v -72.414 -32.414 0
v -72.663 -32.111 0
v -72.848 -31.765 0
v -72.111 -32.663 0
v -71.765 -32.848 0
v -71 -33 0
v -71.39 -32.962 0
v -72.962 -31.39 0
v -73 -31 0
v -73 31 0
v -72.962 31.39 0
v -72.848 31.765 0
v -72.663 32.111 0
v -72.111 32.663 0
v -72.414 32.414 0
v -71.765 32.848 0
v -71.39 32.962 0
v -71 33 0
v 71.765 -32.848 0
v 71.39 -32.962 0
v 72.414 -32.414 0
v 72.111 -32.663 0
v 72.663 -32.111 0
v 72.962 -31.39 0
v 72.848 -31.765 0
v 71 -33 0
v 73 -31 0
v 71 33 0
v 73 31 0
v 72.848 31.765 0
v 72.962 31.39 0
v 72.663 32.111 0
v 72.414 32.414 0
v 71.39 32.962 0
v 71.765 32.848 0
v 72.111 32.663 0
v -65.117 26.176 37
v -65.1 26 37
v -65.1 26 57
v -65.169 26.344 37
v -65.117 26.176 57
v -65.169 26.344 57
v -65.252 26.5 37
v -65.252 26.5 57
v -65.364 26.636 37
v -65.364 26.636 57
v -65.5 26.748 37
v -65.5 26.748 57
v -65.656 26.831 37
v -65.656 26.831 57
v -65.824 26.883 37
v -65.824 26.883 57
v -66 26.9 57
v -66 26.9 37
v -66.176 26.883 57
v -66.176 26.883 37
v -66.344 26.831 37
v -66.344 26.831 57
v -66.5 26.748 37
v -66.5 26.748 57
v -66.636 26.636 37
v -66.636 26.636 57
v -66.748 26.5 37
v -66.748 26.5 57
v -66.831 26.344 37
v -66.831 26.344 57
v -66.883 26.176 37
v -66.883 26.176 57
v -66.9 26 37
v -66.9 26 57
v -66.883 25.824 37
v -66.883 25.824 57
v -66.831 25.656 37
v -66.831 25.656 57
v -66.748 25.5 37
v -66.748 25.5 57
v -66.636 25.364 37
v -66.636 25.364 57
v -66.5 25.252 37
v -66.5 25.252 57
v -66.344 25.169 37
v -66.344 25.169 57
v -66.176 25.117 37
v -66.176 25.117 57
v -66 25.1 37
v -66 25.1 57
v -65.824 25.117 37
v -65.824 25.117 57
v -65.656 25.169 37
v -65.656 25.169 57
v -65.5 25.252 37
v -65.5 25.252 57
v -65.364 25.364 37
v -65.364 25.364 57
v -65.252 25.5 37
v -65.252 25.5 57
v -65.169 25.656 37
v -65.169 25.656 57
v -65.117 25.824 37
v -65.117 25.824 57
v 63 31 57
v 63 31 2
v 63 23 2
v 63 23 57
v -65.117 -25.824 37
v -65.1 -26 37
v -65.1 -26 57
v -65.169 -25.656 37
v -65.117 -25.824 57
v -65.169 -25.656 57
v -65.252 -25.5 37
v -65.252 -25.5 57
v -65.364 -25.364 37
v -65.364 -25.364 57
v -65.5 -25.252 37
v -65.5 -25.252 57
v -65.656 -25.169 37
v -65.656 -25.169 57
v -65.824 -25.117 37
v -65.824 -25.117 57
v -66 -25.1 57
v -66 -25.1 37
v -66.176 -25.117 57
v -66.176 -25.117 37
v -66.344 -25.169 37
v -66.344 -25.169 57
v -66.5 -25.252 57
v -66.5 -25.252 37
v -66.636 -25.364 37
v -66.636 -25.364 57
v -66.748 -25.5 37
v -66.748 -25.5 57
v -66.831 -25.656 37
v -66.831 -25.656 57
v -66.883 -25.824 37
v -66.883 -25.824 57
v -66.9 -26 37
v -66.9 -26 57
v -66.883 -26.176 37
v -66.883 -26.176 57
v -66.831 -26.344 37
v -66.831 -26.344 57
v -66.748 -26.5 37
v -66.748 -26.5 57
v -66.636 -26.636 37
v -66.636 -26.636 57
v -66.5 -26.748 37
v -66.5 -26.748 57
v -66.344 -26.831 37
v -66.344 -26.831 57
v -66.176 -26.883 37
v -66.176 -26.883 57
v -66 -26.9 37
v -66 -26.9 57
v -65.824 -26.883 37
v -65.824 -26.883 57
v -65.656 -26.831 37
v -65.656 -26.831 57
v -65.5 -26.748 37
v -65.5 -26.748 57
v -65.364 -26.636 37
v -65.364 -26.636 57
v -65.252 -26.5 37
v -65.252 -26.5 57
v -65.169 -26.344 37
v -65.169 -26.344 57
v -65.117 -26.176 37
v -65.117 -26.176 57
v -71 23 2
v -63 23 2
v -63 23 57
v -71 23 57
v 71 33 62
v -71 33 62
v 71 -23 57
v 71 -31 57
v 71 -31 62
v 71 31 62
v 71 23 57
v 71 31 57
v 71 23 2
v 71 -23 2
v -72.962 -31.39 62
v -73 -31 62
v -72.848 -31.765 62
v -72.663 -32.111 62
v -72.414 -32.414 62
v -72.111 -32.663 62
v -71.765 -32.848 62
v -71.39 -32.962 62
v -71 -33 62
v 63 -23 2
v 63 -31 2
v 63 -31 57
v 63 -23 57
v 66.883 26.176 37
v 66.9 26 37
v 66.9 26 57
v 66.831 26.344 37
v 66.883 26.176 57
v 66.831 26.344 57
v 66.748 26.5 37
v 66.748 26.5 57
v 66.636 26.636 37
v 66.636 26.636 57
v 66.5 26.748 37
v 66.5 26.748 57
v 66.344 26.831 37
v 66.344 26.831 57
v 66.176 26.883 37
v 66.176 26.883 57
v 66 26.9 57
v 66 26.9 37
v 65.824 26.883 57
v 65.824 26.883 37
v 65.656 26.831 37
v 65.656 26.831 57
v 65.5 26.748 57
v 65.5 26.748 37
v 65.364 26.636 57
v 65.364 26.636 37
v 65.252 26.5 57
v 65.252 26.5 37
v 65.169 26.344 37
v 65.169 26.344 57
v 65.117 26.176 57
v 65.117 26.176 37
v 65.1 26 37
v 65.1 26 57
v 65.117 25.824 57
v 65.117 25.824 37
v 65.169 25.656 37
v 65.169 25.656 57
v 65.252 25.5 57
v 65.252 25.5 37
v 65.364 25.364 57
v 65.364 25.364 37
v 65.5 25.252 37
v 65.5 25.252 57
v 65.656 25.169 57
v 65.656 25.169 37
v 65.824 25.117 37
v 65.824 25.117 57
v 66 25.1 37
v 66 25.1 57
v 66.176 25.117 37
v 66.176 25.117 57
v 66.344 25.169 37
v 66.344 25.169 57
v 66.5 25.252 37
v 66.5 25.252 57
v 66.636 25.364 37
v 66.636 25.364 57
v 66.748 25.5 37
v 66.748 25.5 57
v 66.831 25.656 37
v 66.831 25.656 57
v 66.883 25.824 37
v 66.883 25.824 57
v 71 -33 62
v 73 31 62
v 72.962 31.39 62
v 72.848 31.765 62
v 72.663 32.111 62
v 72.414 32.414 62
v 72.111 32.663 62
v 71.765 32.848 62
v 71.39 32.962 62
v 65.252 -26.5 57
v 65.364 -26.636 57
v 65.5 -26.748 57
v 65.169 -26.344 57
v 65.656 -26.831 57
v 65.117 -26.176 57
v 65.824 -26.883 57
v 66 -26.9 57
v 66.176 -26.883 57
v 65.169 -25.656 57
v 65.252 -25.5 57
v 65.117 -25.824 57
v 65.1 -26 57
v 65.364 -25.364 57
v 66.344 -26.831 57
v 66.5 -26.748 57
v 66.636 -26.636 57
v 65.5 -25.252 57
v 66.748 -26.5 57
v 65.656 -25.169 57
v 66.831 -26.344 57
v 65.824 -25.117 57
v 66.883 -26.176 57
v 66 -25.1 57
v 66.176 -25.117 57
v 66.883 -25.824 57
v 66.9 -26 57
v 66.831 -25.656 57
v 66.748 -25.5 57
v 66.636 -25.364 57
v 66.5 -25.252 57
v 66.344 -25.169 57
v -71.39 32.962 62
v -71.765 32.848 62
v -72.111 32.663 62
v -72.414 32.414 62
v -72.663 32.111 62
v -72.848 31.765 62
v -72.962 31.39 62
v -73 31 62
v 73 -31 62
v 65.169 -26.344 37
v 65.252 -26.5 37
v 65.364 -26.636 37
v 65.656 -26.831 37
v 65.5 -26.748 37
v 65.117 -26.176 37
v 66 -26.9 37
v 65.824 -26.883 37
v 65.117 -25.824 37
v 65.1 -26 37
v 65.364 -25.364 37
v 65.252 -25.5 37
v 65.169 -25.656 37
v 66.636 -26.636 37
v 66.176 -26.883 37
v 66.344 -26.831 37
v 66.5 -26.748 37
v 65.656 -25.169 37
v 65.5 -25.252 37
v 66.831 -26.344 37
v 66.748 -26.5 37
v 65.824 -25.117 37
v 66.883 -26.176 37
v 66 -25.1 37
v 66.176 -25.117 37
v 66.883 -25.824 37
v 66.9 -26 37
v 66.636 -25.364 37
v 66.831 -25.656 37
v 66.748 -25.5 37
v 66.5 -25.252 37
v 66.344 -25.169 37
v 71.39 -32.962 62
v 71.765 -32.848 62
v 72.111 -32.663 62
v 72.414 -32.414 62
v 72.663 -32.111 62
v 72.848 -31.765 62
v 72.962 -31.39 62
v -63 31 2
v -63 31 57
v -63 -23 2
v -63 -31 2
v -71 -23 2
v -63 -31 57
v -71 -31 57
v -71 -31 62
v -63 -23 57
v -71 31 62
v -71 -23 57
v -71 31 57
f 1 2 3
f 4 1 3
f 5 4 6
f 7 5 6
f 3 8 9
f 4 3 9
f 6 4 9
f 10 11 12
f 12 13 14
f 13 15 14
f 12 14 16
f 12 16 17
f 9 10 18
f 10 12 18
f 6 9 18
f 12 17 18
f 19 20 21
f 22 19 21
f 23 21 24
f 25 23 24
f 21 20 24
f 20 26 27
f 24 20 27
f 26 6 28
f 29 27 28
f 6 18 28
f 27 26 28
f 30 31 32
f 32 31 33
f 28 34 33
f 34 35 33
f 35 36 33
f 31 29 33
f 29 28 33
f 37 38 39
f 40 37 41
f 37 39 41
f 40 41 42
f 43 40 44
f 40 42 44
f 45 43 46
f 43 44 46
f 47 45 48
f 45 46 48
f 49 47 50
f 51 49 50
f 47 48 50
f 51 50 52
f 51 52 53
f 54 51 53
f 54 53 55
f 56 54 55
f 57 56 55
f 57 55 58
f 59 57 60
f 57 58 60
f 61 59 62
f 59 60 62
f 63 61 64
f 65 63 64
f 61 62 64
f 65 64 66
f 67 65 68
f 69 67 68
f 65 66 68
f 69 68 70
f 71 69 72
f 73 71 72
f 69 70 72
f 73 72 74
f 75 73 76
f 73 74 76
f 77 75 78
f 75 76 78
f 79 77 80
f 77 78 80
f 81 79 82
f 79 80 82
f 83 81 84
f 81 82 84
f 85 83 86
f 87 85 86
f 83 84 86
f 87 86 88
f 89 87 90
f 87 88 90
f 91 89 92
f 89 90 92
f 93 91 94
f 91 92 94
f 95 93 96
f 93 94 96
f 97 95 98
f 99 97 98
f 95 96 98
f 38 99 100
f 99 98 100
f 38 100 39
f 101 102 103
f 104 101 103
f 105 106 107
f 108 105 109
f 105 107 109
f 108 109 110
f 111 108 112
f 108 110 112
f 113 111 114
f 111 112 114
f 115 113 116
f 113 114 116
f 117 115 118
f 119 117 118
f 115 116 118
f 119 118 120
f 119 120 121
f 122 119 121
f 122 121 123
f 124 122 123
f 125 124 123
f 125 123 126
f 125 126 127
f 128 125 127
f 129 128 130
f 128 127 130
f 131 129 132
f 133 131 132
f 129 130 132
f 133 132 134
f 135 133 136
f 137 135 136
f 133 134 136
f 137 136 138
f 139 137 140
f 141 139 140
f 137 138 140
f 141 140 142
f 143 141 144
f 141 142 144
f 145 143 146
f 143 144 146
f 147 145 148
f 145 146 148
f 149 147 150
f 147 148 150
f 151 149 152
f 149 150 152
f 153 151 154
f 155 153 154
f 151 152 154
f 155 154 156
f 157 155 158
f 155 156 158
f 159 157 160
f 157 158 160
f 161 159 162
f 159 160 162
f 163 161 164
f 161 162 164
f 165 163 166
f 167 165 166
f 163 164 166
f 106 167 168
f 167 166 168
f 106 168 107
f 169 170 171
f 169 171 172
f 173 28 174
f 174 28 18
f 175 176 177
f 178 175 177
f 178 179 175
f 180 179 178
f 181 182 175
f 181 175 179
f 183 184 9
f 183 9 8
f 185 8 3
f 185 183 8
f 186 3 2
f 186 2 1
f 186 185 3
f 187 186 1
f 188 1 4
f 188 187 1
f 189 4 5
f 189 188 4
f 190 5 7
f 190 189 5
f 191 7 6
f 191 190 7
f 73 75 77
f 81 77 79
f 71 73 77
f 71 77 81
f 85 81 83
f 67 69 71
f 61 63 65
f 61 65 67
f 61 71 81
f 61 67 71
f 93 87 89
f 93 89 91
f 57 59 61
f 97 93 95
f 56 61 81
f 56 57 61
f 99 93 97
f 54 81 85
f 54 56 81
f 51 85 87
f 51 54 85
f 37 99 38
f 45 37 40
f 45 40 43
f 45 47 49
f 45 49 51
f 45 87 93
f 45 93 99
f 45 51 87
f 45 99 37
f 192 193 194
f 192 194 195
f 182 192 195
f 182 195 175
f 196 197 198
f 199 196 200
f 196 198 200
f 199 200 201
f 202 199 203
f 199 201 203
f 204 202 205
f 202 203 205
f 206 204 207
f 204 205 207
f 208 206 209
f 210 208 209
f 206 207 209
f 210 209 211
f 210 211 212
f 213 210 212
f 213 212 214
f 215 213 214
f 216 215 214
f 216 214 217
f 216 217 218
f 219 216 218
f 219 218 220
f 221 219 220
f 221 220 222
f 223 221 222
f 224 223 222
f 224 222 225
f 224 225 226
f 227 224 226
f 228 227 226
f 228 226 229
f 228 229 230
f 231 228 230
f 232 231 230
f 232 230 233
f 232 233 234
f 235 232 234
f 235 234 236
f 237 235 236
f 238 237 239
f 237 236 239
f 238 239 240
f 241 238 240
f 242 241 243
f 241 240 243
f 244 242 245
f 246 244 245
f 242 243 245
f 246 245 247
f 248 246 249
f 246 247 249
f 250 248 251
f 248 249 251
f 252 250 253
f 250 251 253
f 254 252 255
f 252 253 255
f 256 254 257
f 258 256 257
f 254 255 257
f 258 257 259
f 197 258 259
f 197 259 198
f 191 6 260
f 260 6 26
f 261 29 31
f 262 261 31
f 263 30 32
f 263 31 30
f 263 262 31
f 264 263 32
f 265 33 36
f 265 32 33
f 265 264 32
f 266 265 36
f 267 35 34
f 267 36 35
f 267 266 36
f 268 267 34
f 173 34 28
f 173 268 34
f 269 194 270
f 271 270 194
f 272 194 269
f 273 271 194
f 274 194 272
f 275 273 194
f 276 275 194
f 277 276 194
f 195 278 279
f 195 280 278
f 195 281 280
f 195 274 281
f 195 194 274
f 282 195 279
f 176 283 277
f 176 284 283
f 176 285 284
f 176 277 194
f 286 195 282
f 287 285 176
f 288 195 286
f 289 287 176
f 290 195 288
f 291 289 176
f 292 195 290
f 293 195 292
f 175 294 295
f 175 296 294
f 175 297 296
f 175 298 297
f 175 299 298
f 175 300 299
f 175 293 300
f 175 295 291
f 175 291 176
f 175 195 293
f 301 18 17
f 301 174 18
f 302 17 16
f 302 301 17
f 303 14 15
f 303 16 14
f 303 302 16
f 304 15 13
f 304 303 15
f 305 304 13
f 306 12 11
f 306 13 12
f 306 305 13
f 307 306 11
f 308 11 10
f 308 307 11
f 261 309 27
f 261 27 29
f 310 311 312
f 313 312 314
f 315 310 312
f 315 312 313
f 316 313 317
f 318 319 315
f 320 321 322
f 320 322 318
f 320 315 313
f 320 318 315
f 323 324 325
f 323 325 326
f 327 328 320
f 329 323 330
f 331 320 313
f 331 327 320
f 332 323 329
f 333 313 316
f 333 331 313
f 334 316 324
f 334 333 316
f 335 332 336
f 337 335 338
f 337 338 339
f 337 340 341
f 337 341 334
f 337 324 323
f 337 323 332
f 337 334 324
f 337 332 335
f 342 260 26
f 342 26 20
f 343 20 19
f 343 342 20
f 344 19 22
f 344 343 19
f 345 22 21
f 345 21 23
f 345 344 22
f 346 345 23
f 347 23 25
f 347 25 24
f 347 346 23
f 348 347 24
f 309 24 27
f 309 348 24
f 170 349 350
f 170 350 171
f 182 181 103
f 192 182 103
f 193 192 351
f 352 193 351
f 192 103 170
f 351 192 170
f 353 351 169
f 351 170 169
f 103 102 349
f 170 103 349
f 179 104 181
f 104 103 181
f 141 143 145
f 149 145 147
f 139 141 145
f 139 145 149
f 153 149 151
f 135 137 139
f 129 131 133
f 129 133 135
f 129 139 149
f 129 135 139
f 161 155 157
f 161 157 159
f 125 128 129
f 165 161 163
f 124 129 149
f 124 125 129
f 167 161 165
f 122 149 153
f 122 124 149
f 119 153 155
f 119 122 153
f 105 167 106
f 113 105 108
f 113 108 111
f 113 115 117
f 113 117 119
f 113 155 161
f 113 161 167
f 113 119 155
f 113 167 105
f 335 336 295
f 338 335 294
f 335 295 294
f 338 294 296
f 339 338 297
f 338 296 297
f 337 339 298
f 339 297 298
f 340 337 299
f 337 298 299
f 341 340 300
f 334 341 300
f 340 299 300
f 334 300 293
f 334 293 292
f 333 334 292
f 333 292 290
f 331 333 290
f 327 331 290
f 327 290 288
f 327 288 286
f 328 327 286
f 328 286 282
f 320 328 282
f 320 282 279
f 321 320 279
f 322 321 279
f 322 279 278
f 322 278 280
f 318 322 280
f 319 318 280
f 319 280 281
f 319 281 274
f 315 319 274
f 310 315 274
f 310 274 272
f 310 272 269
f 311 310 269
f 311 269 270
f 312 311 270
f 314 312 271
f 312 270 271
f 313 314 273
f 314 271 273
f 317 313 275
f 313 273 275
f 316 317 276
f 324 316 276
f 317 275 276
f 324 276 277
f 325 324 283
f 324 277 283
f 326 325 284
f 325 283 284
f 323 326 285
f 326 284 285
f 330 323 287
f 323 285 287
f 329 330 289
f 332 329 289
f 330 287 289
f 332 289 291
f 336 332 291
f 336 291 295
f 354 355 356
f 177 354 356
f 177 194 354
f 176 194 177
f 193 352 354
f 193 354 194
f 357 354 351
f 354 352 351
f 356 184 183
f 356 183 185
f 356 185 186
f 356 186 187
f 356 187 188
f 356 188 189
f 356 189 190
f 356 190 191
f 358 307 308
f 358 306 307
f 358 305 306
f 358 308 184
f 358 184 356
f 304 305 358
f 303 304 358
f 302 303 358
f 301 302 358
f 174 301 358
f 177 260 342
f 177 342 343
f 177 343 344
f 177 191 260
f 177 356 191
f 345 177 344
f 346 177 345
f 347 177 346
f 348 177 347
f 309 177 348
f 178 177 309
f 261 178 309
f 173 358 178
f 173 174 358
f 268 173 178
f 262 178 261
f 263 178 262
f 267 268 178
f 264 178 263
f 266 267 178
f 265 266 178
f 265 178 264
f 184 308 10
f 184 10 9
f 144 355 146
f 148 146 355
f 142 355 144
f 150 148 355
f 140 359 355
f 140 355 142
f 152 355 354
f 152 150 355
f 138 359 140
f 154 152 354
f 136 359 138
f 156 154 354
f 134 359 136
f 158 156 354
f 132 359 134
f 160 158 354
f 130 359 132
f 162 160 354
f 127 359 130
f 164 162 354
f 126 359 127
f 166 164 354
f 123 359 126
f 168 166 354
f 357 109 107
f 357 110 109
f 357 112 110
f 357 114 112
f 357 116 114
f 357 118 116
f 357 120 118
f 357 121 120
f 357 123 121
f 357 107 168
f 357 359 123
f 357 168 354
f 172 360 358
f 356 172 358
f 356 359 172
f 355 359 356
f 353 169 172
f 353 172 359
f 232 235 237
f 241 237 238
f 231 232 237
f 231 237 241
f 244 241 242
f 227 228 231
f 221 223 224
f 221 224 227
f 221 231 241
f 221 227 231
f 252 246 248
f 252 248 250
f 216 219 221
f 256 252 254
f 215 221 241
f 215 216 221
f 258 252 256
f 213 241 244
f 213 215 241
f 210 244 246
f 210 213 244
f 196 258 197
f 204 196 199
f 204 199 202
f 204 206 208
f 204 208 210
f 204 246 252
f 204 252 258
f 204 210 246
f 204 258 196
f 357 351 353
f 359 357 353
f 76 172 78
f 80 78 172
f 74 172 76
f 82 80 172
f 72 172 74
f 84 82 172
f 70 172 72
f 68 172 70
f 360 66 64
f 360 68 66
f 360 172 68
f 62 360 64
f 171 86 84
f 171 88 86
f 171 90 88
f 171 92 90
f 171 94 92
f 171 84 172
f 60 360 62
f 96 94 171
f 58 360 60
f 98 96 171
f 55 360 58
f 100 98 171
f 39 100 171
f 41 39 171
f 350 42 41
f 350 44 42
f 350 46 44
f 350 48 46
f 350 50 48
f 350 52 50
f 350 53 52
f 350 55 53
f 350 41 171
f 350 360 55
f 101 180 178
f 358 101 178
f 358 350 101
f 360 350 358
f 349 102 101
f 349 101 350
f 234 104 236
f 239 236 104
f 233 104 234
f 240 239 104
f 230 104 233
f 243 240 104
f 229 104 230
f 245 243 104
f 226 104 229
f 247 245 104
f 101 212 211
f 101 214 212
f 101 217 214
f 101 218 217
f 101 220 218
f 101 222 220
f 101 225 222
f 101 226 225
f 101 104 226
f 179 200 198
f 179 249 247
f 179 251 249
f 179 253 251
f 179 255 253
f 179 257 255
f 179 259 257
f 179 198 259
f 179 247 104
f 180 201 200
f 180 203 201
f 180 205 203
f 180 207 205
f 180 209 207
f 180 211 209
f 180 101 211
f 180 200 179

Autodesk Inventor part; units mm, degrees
ref_plane "YZ Plane" through (0, 0, 0) normal (1, 0, 0) x (0, 1, 0)
ref_plane "XZ Plane" through (0, 0, 0) normal (0, 1, 0) x (-1, 0, 0)
ref_plane "XY Plane" through (0, 0, 0) normal (0, 0, 1) x (1, 0, 0)
sketch "Sketch1" plane through (0, 0, 0) normal (0, 0, 1) x (1, 0, 0)
  line L0 (-71, -31) -> (71, -31)
  line L1 (71, -31) -> (71, 31)
  line L2 (71, 31) -> (-71, 31)
  line L3 (-71, 31) -> (-71, -31)
  line L4 (-71, -31) -> (71, 31) construction
  line L5 (71, -31) -> (-71, 31) construction
  line L6 (-73, -33) -> (73, -33)
  line L7 (73, -33) -> (73, 33)
  line L8 (73, 33) -> (-73, 33)
  line L9 (-73, 33) -> (-73, -33)
  line L10 (-73, -33) -> (73, 33) construction
  line L11 (73, -33) -> (-73, 33) construction
  line L12 (-71, 31) -> (71, 31)
  line L13 (71, 31) -> (71, -31)
  line L14 (71, -31) -> (-71, -31)
  line L15 (-71, -31) -> (-71, 31)
  line L16 (-71, 31) -> (71, -31) construction
  line L17 (71, 31) -> (-71, -31) construction
  point P0 (0, 0)
  dimension "d0" = 142
  dimension "d1" = 62
  dimension "d2" = 2
  dimension "d3" = 2
extrude "Extrusion1" add sketch "Sketch1" along normal blind 62
sketch "Sketch2" plane through (0, 0, 0) normal (0, 0, -1) x (-1, 0, 0)
  line L0 (71, -31) -> (-71, -31) projected
  line L1 (71, 31) -> (-71, 31)
  line L2 (-71, 31) -> (-71, -31)
  line L3 (-71, -31) -> (71, -31)
  line L4 (71, -31) -> (71, 31)
  line L5 (71, 31) -> (-71, -31) construction
  line L6 (-71, 31) -> (71, -31) construction
  point P0 (0, 0)
extrude "Extrusion2" add sketch "Sketch2" against normal blind 2
sketch "Sketch3" plane through (0, 0, 2) normal (0, 0, 1) x (1, 0, 0)
  line L0 (-71, 31) -> (71, 31) projected
  line L1 (-71, 31) -> (-63, 31)
  line L2 (-63, 31) -> (-63, 23)
  line L3 (-63, 23) -> (-71, 23)
  line L4 (-71, 23) -> (-71, 31)
  line L5 (71, -31) -> (-71, -31) projected
  line L6 (-71, -31) -> (-63, -31)
  line L7 (-63, -31) -> (-63, -23)
  line L8 (-63, -23) -> (-71, -23)
  line L9 (-71, -23) -> (-71, -31)
  line L10 (71, 31) -> (71, -31) projected
  line L11 (71, 31) -> (63, 31)
  line L12 (63, 31) -> (63, 23)
  line L13 (63, 23) -> (71, 23)
  line L14 (71, 23) -> (71, 31)
  line L15 (71, 31) -> (71, -31) projected
  line L16 (71, -31) -> (63, -31)
  line L17 (63, -31) -> (63, -23)
  line L18 (63, -23) -> (71, -23)
  line L19 (71, -23) -> (71, -31)
  point P0 (0, 0)
  dimension "d8" = 8
  dimension "d9" = 8
  dimension "d10" = 8
  dimension "d11" = 8
  dimension "d12" = 8
  dimension "d13" = 8
  dimension "d14" = 8
  dimension "d15" = 8
extrude "Extrusion3" add sketch "Sketch3" along normal blind 55
sketch "Sketch4" plane through (0, 0, 57) normal (0, 0, 1) x (1, 0, 0)
  circle A0 centre (-66, 26) radius 0.9
  circle A1 centre (66, 26) radius 0.9
  circle A2 centre (66, -26) radius 0.9
  circle A3 centre (-66, -26) radius 0.9
  line L0 (-71, 23) -> (-71, 31) projected
  line L1 (-71, 31) -> (-63, 31) projected
  line L2 (63, 31) -> (71, 31) projected
  line L3 (-71, -31) -> (-71, 31) projected
  point P0 (0, 0)
  dimension "d18" = 1.8
  dimension "d19" = 1.8
  dimension "d20" = 1.8
  dimension "d21" = 1.8
  dimension "d22" = 132
  dimension "d23" = 52
  dimension "d24" = 132
  dimension "d25" = 5
  dimension "d26" = 5
  dimension "d27" = 52
  dimension "d28" = 5
  dimension "d29" = 5
extrude "Extrusion4" cut sketch "Sketch4" against normal blind 20
fillet "Fillet1" radius 2 4 edges at (-73, -33, 31) (73, -33, 31) (73, 33, 31) (-73, 33, 31)
equation "\"d10\" = d8"
equation "\"d11\" = d9"
equation "\"d12\" = d8"
equation "\"d13\" = d9"
equation "\"d14\" = d8"
equation "\"d15\" = d9"
equation "\"d19\" = d18"
equation "\"d20\" = d18"
equation "\"d21\" = d18"
equation "\"d24\" = d22"
equation "\"d25\" = d26"
equation "\"d27\" = d23"
equation "\"d28\" = d26"
equation "\"d29\" = d26"
properties part number "Box"
